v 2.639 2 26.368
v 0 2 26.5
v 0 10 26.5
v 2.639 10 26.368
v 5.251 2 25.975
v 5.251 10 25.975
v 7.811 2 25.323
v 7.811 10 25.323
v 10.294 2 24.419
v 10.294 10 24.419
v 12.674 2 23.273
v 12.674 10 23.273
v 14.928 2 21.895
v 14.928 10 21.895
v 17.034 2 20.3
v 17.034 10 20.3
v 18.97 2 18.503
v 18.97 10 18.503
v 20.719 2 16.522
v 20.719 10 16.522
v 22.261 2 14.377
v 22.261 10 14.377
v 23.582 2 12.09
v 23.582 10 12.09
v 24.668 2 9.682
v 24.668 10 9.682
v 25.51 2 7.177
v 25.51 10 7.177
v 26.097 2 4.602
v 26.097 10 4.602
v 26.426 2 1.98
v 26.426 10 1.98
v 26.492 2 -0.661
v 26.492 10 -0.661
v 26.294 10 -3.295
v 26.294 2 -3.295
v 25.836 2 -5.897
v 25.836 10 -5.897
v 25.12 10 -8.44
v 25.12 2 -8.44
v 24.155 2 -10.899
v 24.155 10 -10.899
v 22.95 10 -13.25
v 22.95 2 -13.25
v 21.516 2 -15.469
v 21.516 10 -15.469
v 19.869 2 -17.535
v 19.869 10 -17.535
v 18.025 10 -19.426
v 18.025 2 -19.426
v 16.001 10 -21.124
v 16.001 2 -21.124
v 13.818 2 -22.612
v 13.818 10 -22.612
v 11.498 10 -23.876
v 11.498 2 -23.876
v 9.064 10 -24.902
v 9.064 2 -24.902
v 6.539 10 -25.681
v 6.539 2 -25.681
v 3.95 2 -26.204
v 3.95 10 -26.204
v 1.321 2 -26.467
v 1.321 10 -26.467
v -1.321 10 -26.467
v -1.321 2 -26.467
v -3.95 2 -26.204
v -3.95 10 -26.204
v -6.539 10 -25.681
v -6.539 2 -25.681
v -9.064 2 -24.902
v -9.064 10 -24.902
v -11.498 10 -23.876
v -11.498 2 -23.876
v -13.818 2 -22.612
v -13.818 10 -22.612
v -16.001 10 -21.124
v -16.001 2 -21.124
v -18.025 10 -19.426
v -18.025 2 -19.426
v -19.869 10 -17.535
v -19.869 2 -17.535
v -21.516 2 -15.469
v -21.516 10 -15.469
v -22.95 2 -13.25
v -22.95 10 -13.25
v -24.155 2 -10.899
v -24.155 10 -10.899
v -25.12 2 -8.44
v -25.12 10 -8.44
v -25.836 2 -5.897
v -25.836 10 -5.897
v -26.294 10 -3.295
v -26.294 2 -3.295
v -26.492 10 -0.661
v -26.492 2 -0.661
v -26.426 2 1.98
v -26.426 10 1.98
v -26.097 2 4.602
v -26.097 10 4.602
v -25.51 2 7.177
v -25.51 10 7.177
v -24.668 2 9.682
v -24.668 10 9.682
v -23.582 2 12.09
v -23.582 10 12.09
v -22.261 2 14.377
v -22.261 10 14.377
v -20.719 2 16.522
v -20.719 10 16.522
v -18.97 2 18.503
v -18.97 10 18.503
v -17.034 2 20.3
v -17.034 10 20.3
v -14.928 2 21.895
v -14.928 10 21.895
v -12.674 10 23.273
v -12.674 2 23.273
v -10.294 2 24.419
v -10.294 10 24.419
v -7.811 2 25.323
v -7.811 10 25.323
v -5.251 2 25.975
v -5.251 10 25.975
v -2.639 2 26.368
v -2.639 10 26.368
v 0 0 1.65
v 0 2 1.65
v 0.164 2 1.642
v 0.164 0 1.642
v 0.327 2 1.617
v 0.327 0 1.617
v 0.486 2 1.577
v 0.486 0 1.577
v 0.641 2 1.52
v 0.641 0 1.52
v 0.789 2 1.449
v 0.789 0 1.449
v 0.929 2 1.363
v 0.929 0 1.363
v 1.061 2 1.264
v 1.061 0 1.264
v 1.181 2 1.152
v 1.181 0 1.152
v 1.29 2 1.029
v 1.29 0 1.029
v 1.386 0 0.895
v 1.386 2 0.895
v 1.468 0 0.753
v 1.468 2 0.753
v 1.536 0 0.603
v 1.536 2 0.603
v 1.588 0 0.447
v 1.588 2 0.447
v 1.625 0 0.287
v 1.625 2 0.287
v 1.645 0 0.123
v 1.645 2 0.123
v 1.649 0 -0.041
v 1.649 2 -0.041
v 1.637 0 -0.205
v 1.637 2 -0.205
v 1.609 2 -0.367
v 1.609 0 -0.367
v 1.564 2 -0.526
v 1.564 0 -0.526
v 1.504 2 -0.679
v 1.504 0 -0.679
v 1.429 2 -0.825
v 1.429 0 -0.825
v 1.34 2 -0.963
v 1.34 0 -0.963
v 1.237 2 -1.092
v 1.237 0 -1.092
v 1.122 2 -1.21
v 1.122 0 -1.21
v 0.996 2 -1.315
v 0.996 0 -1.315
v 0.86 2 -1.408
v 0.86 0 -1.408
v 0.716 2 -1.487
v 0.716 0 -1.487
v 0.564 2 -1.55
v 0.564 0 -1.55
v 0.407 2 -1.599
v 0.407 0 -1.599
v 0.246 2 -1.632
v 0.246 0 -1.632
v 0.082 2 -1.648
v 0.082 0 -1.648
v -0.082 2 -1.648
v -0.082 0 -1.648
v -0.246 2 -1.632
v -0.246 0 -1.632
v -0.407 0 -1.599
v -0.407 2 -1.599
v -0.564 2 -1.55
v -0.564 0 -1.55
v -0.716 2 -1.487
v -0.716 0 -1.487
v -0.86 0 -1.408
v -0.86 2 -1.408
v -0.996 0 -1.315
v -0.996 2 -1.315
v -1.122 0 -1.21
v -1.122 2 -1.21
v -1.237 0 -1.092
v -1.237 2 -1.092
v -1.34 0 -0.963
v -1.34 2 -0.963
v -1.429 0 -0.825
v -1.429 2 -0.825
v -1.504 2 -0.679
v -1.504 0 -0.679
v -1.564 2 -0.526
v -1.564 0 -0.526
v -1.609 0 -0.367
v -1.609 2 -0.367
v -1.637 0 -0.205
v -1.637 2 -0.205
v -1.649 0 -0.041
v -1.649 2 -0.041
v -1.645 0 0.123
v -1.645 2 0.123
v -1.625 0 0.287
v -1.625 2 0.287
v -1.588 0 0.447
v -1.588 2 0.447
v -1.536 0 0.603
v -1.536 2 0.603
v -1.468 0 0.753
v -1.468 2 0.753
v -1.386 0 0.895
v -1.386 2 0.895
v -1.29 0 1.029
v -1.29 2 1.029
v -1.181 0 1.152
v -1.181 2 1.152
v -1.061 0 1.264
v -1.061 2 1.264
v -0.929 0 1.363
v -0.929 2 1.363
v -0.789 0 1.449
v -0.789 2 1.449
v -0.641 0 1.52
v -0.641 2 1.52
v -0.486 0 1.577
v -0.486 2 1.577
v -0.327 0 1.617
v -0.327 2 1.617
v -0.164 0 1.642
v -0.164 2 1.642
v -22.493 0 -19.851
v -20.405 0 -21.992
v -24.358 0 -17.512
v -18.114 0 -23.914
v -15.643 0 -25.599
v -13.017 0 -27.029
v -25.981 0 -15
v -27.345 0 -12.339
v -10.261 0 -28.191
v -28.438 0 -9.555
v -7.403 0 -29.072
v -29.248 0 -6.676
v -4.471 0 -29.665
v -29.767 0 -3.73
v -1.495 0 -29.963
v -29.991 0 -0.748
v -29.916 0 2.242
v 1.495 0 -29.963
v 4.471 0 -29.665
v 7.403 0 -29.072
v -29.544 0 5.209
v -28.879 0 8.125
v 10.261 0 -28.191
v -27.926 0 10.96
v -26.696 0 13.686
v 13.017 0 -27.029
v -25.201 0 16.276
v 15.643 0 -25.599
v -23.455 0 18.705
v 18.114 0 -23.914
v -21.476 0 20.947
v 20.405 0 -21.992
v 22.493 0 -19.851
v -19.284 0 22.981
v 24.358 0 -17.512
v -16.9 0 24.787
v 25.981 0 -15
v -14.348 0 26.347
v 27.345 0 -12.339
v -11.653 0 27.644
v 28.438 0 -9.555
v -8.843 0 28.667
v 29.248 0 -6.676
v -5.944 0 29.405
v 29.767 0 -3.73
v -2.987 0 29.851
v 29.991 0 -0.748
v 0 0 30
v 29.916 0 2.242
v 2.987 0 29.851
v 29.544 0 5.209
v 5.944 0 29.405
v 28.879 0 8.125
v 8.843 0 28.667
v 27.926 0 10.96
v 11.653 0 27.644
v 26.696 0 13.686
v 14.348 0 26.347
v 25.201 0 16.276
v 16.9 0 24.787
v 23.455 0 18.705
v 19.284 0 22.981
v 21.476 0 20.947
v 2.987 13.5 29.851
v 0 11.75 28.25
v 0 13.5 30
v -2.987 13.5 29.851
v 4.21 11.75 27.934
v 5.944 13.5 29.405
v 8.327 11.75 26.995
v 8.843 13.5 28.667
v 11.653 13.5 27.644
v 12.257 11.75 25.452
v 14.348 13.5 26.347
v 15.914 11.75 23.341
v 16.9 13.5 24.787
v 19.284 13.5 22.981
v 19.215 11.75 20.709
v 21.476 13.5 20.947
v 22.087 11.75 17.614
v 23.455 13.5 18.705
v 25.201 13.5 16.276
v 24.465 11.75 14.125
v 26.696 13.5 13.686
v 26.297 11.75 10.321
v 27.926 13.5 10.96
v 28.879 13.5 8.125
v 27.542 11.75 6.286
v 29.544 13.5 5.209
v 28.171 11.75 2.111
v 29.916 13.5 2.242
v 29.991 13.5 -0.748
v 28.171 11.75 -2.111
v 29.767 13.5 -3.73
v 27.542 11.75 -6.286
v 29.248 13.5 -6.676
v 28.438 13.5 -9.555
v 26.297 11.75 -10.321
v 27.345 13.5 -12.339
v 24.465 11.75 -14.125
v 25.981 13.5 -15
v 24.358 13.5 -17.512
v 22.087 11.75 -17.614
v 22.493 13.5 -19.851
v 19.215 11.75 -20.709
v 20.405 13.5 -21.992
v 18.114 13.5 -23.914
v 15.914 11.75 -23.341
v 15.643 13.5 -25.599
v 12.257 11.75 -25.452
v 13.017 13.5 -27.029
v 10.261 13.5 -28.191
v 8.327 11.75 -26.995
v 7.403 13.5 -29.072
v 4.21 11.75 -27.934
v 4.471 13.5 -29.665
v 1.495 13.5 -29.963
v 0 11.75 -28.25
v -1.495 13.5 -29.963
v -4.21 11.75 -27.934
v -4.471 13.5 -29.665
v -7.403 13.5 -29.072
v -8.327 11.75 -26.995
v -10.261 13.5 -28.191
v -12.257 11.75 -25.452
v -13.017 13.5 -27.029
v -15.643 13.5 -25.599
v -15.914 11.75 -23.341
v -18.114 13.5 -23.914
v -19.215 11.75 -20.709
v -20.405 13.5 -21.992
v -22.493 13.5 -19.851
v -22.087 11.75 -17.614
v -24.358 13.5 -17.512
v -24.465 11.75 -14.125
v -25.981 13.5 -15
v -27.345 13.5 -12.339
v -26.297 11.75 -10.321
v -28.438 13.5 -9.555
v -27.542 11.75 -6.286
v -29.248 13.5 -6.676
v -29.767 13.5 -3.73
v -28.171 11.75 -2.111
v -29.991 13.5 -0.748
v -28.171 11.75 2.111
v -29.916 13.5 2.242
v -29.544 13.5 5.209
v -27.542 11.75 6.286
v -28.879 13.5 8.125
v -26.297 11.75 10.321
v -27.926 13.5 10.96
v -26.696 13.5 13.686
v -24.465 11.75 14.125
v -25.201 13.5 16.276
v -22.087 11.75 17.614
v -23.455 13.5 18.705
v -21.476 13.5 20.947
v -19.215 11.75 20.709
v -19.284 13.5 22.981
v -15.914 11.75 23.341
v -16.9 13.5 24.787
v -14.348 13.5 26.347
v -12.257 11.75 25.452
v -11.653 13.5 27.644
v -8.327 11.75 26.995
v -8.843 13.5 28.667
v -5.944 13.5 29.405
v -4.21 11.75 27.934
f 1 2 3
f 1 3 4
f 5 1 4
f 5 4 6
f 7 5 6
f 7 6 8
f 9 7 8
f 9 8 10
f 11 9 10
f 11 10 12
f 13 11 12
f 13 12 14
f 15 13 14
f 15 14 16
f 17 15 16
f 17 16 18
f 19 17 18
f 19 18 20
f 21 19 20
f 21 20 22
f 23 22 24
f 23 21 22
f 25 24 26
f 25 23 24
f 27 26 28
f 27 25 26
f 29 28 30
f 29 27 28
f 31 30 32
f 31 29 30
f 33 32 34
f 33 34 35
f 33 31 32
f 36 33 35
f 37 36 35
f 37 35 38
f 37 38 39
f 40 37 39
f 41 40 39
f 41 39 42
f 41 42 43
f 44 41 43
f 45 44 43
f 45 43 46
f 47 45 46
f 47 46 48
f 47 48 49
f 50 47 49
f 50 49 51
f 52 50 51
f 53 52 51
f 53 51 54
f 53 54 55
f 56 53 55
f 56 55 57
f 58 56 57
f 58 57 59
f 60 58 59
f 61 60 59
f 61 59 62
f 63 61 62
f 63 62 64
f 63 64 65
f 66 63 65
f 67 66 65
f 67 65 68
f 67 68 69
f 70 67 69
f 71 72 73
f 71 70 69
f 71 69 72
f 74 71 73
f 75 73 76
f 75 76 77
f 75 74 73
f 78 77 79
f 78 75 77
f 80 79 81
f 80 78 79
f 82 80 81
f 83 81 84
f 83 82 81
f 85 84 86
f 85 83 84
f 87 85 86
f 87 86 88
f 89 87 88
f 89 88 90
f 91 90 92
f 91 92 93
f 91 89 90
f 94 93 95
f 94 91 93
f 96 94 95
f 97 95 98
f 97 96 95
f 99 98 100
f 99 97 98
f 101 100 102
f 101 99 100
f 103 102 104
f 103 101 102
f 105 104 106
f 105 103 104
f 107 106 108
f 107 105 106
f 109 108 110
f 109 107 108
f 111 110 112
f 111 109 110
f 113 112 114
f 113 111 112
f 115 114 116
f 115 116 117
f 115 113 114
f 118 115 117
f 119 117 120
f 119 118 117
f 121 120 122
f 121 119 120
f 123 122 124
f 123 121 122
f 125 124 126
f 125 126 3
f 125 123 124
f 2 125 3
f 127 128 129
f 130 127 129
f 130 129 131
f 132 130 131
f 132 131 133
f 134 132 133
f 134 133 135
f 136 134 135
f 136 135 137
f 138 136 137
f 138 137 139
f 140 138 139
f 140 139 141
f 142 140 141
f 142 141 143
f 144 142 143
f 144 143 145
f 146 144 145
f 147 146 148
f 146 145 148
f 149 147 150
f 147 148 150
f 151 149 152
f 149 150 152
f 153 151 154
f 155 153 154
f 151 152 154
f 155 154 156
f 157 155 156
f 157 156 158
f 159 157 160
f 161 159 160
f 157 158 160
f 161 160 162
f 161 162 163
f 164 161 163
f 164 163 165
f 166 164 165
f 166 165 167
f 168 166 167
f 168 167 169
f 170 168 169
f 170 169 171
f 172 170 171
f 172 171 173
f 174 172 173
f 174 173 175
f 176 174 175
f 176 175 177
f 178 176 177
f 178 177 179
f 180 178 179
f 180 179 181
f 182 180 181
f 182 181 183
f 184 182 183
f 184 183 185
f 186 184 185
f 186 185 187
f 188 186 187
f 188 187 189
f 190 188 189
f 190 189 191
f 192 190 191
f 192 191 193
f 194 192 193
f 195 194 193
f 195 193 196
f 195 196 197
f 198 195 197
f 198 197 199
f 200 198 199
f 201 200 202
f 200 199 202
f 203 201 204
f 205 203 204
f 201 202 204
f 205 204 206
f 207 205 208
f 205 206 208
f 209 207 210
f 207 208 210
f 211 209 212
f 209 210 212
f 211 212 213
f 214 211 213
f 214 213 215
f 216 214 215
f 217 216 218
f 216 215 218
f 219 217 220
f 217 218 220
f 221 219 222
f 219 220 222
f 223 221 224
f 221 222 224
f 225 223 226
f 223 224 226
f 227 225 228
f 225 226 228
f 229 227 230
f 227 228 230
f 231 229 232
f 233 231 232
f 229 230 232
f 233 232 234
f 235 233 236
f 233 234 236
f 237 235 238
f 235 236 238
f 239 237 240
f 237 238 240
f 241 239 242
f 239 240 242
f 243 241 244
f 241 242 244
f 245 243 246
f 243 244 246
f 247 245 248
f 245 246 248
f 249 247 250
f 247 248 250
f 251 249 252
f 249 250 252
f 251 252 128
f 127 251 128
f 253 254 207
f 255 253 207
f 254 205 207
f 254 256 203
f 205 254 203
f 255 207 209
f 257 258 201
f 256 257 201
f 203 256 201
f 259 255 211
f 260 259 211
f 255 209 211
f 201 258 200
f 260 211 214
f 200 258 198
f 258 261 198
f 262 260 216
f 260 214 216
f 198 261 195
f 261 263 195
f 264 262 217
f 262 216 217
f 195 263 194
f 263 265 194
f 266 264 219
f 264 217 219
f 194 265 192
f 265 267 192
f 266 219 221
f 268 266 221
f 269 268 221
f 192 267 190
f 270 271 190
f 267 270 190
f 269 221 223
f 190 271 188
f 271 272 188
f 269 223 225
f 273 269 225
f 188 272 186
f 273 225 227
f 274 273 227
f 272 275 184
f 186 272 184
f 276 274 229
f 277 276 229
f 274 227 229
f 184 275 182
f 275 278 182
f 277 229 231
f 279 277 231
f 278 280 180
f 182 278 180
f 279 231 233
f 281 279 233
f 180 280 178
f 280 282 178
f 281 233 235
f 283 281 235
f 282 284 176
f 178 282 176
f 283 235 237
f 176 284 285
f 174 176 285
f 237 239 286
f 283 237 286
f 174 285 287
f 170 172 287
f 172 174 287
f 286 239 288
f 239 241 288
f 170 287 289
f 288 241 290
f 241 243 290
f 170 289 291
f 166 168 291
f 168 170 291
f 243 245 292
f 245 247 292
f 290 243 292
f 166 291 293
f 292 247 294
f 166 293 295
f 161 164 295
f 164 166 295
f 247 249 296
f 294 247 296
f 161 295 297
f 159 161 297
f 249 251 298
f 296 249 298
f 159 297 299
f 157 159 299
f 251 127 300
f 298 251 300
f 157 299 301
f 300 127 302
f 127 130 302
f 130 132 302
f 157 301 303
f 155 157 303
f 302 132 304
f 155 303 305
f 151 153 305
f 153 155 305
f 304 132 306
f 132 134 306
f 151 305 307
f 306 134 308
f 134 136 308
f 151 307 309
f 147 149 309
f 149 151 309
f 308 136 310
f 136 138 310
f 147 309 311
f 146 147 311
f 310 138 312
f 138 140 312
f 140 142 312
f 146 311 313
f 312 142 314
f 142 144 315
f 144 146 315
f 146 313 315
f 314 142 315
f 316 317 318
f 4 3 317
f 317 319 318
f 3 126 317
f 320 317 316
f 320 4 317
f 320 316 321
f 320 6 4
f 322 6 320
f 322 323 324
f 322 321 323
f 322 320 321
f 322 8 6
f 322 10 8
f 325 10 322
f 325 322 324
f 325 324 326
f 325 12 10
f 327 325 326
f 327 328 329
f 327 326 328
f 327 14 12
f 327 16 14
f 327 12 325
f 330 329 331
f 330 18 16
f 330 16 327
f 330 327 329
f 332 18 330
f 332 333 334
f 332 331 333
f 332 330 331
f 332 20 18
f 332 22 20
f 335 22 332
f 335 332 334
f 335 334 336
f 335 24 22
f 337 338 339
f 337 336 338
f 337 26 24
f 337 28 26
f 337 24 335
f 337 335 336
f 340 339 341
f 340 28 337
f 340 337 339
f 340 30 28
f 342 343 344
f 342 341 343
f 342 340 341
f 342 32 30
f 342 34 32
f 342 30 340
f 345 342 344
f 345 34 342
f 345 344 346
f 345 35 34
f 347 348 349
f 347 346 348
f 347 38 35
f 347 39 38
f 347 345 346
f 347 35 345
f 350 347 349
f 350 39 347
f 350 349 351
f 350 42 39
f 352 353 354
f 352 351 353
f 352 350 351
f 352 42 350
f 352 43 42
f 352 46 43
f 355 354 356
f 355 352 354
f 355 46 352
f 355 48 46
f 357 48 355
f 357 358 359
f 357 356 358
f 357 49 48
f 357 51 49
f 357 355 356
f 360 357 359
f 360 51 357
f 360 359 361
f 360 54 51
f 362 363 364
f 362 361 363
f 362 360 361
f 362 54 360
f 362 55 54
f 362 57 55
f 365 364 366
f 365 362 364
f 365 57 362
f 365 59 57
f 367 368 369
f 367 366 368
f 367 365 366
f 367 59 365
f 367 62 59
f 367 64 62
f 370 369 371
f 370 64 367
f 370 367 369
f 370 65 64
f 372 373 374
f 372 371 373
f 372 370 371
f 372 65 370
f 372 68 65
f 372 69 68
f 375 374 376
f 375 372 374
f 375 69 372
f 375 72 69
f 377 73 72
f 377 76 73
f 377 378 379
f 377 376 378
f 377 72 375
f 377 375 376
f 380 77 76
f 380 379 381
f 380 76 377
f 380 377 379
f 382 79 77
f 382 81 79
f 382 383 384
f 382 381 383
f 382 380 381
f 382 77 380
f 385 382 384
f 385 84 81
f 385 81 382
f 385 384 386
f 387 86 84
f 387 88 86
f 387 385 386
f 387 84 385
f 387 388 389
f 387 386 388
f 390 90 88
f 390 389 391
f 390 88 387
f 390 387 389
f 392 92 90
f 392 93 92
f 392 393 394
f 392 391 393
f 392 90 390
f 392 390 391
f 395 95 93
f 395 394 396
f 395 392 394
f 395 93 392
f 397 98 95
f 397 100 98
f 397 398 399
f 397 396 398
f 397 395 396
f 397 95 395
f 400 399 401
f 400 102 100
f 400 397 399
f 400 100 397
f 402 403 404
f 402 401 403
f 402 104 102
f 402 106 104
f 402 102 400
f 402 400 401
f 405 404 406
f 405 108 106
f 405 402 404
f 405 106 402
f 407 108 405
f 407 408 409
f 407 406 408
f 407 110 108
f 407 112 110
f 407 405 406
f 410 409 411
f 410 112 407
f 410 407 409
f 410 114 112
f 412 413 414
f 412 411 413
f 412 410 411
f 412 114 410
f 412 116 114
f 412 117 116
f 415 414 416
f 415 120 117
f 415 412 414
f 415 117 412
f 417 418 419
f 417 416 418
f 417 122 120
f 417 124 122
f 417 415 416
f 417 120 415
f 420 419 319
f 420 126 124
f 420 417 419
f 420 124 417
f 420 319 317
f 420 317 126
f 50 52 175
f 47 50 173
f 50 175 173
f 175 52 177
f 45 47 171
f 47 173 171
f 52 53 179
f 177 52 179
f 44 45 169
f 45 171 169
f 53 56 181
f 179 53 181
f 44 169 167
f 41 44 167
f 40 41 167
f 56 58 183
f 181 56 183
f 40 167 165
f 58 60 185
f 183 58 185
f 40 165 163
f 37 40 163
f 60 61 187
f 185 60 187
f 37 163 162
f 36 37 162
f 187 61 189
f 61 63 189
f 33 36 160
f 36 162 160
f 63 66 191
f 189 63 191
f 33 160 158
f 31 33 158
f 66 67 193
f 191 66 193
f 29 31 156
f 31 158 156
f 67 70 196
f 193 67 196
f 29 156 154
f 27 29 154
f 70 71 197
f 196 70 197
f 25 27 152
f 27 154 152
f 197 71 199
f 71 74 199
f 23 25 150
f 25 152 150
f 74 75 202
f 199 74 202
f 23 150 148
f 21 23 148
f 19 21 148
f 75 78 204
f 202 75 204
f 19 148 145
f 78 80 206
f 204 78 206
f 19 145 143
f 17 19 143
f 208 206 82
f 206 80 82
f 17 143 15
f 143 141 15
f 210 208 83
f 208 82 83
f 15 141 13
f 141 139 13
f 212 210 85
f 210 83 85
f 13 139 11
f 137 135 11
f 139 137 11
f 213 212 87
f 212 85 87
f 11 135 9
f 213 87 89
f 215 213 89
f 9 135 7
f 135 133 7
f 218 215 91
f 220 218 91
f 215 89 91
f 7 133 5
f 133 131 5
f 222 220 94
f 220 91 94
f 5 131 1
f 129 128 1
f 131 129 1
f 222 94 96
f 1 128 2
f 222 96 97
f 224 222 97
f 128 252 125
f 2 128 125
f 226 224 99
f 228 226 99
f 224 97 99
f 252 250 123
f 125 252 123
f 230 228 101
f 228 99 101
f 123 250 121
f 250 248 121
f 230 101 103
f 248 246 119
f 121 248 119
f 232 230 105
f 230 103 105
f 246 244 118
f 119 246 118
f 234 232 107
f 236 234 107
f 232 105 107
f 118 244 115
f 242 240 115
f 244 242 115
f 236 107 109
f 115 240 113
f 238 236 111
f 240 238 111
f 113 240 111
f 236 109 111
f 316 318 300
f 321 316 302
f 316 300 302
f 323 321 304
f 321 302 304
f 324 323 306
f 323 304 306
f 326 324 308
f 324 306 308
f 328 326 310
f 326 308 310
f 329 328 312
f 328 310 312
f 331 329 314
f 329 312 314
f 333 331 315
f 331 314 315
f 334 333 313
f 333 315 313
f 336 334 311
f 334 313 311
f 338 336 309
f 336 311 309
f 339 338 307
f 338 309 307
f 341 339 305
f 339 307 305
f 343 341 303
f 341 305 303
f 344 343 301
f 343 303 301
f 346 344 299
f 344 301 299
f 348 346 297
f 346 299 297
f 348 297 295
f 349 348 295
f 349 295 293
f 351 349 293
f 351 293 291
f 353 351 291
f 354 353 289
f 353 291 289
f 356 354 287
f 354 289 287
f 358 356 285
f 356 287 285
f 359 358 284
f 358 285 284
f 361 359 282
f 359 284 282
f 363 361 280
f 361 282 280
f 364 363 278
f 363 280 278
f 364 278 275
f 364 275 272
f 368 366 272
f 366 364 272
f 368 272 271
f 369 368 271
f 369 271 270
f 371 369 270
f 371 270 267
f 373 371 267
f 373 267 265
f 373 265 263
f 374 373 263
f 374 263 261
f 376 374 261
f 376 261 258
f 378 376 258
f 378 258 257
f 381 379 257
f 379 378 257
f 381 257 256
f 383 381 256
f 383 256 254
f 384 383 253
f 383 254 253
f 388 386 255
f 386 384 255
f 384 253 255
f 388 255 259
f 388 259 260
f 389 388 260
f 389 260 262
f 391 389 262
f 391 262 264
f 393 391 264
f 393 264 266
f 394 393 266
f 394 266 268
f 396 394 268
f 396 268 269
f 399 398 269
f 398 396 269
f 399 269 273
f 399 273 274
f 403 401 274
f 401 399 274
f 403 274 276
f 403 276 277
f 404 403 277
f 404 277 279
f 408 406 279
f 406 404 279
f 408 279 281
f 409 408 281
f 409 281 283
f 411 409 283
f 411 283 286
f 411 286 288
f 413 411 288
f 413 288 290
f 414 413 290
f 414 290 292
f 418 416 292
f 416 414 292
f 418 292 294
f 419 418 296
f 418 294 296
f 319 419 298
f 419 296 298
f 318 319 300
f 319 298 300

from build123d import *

# Parameters (mm, degrees)
SKETCH_1_R          = 30
SKETCH_1_R_2        = 26.5
EXTRUDE_1_DEPTH     = 15
SKETCH_2_R          = 30
EXTRUDE_2_DEPTH     = 2
CHAMFER_1_SIZE      = 5
SKETCH_3_R          = 1.65
CUT_EXTRUDE_1_DEPTH = 44.957365708


with BuildPart() as part:
    # 草图1 → 凸台-拉伸1 (new body)
    with BuildSketch(Plane(origin=(0, 0, 0), x_dir=(1, 0, 0), z_dir=(0, 1, 0))):
        with Locations(Location((0, 0, 0), (0, 0, 270))):
            Circle(SKETCH_1_R)
        with Locations(Location((0, 0, 0), (0, 0, 270))):
            Circle(SKETCH_1_R_2, mode=Mode.SUBTRACT)
    extrude(amount=EXTRUDE_1_DEPTH)

    # 草图2 → 凸台-拉伸2 (add)
    with BuildSketch(Plane.XZ):
        with Locations(Location((0, 0, 0), (0, 0, 90))):
            Circle(SKETCH_2_R)
    extrude(amount=-EXTRUDE_2_DEPTH)

    # 倒角1
    # the kernel refuses this chamfer: 5 mm, written as the material it takes off along each edge
    with BuildSketch(Plane(origin=(0, 15, 0), x_dir=(0, 0, 1), z_dir=(-1, 0, 0))) as chamfer_1_piece_1:
        Polygon((26.5 + CHAMFER_1_SIZE, 0), (26.5, -CHAMFER_1_SIZE), (26.5, 0), align=None)
    revolve(axis=Axis((0, 15, 0), (0, 1, 0)), mode=Mode.SUBTRACT)

    # 草图3 → 切除-拉伸1 (cut, through all)
    with BuildSketch(Plane(origin=(0, 2, 0), x_dir=(1, 0, 0), z_dir=(0, 1, 0))):
        with Locations(Location((0, 0, 0), (0, 0, 270))):
            Circle(SKETCH_3_R)
    extrude(amount=-CUT_EXTRUDE_1_DEPTH, mode=Mode.SUBTRACT)


solid = part.part
